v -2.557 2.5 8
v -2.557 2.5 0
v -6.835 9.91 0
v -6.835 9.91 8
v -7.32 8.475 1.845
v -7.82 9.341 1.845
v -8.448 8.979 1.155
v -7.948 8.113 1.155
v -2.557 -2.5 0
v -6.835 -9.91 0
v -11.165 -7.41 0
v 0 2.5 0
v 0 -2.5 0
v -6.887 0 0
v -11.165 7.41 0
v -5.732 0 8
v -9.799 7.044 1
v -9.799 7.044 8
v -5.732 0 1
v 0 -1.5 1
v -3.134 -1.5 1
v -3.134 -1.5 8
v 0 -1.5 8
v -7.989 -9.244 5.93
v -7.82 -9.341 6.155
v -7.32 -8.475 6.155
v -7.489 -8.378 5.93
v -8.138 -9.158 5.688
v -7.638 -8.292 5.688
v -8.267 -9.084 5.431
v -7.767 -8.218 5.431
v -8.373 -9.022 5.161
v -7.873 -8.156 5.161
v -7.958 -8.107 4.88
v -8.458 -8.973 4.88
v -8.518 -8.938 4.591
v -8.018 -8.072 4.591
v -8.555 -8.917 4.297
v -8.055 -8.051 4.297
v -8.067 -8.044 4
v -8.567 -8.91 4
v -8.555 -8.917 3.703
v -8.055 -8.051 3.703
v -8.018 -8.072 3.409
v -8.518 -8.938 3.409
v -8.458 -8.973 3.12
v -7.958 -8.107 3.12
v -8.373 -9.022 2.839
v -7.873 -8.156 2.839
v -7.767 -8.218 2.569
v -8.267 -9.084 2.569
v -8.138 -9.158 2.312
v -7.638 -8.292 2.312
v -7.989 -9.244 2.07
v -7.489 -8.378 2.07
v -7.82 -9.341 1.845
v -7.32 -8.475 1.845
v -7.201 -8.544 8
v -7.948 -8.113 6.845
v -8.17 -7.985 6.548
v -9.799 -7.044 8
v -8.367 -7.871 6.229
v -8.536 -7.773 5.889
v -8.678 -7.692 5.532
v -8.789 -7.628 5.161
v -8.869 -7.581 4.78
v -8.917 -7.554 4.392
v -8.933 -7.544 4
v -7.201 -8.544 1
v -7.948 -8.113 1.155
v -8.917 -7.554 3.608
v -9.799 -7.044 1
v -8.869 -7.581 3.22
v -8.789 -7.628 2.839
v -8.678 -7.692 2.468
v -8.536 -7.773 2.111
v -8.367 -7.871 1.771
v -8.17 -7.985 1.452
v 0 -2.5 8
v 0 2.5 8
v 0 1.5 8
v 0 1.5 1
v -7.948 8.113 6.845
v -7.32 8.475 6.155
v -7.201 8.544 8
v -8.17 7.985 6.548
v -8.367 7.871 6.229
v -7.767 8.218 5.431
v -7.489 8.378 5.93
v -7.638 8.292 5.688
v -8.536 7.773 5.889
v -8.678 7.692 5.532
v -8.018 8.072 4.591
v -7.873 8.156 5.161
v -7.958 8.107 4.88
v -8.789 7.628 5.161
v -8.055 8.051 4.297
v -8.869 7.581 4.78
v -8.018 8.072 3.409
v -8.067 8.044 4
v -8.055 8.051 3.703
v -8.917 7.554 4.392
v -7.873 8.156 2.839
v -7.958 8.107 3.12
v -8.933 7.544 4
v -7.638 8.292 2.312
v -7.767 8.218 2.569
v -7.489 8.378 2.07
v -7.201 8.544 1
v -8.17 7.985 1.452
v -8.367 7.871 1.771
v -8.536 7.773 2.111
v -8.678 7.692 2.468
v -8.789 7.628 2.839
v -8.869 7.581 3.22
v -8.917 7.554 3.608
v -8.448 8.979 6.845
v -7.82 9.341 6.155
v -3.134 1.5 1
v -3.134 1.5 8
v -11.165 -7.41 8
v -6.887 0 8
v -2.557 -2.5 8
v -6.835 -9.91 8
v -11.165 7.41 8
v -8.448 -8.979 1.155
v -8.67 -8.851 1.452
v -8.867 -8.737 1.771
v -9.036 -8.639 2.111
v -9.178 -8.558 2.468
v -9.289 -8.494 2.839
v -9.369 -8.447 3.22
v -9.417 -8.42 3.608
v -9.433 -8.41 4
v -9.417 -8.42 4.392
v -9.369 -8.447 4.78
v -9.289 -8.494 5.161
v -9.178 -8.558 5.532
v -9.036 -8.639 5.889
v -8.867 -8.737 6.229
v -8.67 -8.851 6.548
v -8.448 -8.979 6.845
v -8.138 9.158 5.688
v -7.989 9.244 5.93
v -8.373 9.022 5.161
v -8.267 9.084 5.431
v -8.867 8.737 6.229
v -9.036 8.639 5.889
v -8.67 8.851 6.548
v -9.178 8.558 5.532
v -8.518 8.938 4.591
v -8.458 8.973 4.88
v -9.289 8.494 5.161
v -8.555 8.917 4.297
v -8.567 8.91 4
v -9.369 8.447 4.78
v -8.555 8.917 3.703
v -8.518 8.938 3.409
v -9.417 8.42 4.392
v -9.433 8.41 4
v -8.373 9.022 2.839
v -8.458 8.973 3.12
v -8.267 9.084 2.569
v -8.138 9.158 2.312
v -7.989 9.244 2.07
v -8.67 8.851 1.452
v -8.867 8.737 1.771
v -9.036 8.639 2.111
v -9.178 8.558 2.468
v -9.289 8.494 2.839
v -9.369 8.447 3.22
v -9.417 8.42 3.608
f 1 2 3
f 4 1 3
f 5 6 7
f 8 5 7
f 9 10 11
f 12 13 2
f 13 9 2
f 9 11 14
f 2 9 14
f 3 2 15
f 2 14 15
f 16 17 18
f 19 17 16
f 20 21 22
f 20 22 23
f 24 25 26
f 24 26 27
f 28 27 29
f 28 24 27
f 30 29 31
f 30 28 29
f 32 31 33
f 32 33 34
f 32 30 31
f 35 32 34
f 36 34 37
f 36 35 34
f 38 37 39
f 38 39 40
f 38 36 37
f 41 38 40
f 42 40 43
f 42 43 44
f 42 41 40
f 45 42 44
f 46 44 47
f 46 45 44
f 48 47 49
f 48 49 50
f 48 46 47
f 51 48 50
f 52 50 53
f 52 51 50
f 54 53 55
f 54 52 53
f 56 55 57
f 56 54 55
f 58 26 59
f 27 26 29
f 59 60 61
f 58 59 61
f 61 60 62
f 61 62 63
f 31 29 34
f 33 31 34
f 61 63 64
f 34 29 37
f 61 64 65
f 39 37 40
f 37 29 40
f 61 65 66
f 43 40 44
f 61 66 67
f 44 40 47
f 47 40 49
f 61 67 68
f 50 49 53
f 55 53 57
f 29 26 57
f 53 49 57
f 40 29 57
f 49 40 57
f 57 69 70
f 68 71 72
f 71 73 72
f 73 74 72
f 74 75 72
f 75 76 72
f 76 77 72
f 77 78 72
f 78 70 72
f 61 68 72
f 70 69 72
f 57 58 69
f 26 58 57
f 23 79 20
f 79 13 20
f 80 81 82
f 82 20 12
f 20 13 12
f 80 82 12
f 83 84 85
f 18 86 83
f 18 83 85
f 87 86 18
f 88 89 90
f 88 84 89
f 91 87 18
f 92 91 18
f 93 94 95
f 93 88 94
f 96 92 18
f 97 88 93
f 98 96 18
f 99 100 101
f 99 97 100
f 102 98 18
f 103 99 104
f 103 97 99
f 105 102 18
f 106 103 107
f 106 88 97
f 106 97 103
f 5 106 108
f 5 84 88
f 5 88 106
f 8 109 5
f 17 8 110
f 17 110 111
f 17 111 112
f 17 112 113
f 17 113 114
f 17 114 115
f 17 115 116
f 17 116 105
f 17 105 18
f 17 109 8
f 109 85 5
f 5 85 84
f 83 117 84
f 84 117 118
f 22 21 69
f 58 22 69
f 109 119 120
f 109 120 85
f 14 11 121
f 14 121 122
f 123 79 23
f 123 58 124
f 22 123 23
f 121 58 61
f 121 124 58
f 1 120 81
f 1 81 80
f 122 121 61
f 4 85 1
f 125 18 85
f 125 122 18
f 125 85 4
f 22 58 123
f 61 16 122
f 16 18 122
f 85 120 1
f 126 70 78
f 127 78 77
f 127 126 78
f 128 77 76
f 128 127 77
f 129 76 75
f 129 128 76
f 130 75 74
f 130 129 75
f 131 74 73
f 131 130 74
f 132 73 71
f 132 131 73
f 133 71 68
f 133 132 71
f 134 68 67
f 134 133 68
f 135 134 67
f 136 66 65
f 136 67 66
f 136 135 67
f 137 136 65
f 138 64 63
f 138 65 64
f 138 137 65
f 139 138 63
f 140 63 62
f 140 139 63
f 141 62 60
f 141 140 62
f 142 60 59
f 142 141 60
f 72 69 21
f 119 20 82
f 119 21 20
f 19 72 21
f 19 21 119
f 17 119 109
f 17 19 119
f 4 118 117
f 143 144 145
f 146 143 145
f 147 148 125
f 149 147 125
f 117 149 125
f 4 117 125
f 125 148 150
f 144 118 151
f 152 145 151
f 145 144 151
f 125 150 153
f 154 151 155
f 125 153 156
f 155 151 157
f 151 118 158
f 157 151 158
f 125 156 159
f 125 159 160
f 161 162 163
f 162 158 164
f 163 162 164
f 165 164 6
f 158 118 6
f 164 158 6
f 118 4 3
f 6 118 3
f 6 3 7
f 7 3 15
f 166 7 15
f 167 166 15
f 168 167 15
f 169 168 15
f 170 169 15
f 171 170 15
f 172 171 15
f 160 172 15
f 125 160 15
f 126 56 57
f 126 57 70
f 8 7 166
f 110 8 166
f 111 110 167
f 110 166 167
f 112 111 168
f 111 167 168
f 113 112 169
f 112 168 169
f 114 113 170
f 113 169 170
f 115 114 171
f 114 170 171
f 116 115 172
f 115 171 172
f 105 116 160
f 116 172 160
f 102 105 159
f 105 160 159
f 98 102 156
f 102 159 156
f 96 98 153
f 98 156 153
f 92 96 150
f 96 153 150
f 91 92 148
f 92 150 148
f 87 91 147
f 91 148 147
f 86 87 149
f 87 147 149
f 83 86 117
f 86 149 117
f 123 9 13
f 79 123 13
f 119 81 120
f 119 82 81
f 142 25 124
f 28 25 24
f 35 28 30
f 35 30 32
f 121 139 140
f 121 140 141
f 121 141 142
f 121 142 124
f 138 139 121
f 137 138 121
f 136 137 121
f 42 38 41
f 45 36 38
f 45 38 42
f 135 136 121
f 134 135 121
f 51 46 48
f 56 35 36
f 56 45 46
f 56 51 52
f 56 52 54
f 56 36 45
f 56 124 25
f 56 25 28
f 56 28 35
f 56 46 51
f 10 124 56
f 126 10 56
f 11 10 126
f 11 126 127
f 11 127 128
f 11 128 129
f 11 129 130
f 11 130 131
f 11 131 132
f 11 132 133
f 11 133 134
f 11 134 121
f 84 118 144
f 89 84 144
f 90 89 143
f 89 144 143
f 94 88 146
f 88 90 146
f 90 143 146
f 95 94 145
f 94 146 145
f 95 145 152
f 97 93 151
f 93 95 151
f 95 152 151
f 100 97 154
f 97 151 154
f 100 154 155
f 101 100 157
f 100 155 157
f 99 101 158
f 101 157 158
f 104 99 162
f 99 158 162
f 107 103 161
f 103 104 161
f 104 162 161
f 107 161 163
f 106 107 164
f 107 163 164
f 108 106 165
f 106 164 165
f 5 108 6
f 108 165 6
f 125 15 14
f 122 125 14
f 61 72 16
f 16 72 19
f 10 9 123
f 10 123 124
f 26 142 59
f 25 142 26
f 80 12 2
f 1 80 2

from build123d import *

# Parameters (mm, degrees)
EXTRUDE_THIN1_DEPTH     = 8
SHELL4_T                = -1
CUT_EXTRUDE_THIN1_DEPTH = 8


with BuildPart() as part:
    # Sketch1 → Extrude-Thin1 (new body)
    with BuildSketch(Plane(origin=(0, 0, 0), x_dir=(0, 1, 0), z_dir=(0, 0, 1))):
        Polygon((2.5, 0), (2.5, 2.556624327), (9.910254038, 6.834936491), (7.410254038, 11.165063509), (-2.5, 5.443375673), (-2.5, 0), align=None)
    extrude_thin1 = extrude(amount=EXTRUDE_THIN1_DEPTH)

    # Mirror3: Extrude-Thin1 across plane
    add(extrude_thin1.mirror(Plane.ZX))

    # Shell4
    shell4_openings = [part.faces().sort_by_distance(p)[0] for p in [
        (-5.923522884, 0, 8),
        (0, 0, 4),
    ]]
    offset(amount=SHELL4_T, openings=shell4_openings, kind=Kind.INTERSECTION)

    # Sketch5 → Cut-Extrude-Thin1 (cut)
    with BuildSketch(Plane(origin=(-6, 10.392304845, 0), x_dir=(-0.8660254037844398, -0.49999999999999806, 0), z_dir=(-0.499999999999998, 0.8660254037844397, 0))):
        with BuildLine():
            ThreePointArc((2.10203265, 6.155172414), (2.964101615, 4), (2.10203265, 1.844827586))
            Line((2.10203265, 1.844827586), (2.826170581, 1.155172414))
            ThreePointArc((2.826170581, 1.155172414), (3.964101615, 4), (2.826170581, 6.844827586))
            Line((2.826170581, 6.844827586), (2.10203265, 6.155172414))
        make_face()
    cut_extrude_thin1 = extrude(amount=-CUT_EXTRUDE_THIN1_DEPTH, mode=Mode.SUBTRACT)

    # Mirror4: Cut-Extrude-Thin1 across plane
    add(cut_extrude_thin1.mirror(Plane.ZX), mode=Mode.SUBTRACT)


solid = part.part
